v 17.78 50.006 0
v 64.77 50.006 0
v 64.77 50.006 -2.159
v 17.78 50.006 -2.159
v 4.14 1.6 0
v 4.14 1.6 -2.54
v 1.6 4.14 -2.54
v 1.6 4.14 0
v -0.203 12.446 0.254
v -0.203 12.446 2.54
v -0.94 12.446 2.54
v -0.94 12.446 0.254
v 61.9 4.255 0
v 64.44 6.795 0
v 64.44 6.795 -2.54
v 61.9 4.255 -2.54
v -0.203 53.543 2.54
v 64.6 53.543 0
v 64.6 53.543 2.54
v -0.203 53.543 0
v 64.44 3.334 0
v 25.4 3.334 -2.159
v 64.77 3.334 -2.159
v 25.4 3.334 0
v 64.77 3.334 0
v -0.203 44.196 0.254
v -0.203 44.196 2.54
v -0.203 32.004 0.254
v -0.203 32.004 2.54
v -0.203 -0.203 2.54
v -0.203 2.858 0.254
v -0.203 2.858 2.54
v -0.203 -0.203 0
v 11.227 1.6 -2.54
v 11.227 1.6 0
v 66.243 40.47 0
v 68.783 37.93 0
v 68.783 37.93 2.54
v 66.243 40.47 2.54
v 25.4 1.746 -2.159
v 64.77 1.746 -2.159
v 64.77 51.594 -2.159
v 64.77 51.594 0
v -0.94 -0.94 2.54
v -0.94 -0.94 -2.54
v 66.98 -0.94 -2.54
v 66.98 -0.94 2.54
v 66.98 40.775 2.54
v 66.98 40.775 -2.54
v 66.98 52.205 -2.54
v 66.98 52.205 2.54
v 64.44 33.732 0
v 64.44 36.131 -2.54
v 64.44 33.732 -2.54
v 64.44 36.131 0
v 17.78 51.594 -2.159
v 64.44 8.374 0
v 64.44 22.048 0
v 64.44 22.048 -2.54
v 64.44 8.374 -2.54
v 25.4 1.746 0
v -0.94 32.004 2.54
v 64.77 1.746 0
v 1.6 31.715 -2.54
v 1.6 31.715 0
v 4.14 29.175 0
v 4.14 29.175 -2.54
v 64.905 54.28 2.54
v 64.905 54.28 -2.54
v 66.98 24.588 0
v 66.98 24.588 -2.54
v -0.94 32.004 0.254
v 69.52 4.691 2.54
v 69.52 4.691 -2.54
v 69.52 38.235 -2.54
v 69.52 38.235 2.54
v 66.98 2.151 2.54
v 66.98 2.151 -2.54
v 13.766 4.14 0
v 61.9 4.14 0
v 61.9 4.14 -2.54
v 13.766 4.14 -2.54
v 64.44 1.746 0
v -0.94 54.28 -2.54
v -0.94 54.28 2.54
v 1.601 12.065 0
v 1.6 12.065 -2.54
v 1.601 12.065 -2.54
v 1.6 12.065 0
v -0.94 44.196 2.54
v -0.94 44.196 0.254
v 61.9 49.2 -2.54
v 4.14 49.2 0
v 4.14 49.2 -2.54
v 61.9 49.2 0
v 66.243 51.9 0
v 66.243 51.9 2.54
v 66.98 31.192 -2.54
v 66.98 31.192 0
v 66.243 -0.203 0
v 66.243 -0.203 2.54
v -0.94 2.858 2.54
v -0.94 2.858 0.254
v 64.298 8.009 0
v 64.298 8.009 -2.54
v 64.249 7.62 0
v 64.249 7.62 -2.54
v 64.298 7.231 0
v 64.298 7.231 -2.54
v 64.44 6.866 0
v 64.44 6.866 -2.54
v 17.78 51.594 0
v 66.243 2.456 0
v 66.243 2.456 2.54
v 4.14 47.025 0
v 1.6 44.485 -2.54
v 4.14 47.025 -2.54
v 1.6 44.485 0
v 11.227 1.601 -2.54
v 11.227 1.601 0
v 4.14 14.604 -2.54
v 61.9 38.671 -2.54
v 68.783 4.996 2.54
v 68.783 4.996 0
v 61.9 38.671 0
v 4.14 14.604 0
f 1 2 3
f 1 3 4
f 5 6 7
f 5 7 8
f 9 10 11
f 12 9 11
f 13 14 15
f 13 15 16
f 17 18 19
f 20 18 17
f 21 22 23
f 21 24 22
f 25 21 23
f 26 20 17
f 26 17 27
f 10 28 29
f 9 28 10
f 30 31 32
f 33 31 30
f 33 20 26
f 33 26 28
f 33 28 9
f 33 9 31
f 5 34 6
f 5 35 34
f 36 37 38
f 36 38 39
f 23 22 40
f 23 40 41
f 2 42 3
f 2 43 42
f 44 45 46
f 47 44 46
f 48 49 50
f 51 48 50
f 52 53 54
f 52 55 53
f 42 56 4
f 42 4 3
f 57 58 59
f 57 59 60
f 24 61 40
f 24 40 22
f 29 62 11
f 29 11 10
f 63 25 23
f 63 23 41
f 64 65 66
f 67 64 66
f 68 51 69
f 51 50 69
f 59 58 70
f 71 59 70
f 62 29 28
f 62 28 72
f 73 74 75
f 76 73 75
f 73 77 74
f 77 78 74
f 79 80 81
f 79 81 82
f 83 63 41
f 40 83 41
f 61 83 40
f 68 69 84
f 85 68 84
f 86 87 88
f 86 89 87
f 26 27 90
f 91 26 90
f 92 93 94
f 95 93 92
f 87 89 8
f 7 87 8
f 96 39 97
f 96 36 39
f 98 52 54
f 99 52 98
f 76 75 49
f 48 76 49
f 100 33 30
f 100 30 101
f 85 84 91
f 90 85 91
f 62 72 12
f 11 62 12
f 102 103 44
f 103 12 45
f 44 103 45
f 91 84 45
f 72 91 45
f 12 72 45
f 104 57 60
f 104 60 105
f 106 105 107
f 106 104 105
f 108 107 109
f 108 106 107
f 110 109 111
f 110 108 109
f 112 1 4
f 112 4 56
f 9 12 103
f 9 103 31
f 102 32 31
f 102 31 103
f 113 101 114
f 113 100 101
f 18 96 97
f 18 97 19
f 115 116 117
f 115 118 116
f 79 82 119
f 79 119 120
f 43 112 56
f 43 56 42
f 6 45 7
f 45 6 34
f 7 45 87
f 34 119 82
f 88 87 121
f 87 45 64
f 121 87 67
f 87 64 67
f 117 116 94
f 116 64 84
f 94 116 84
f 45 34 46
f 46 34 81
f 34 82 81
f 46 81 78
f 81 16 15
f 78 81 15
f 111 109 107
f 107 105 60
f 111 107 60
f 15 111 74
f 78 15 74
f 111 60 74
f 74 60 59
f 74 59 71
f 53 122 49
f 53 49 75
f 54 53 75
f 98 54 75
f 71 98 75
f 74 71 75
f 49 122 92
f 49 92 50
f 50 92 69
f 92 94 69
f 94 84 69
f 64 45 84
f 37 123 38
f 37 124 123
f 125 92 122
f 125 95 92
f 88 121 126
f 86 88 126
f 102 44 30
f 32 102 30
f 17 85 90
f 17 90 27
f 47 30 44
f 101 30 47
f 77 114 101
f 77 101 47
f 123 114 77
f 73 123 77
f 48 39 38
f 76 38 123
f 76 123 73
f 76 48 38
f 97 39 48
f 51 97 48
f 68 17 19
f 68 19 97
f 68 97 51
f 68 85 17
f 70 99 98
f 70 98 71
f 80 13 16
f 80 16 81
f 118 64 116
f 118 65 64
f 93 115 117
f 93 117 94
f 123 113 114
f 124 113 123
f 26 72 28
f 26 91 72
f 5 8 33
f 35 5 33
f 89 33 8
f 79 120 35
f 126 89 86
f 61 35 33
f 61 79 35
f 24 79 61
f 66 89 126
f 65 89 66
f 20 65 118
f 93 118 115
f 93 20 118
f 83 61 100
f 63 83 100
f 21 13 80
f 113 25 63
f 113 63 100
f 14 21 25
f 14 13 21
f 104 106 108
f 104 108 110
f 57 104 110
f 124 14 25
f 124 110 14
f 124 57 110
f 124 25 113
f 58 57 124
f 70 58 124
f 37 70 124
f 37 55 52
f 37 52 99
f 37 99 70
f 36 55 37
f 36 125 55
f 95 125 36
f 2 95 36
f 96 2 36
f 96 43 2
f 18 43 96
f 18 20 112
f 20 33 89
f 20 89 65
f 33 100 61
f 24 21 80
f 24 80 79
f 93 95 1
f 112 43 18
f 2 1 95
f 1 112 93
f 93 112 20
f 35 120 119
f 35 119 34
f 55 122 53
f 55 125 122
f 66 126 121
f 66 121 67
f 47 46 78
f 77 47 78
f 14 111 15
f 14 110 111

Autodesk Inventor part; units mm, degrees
ref_plane "YZ Plane" through (0, 0, 0) normal (1, 0, 0) x (0, 1, 0)
ref_plane "XZ Plane" through (0, 0, 0) normal (0, 1, 0) x (-1, 0, 0)
ref_plane "XY Plane" through (0, 0, 0) normal (0, 0, 1) x (1, 0, 0)
sketch "Sketch1" plane through (0, 0, 0) normal (0, 0, 1) x (1, 0, 0)
  line L0 (0, 53.34) -> (64.516, 53.34)
  line L1 (64.516, 53.34) -> (66.04, 51.816)
  line L2 (66.04, 51.816) -> (66.04, 40.386)
  line L3 (66.04, 40.386) -> (68.58, 37.846)
  line L4 (68.58, 37.846) -> (68.58, 5.08)
  line L5 (66.04, 0) -> (0, 0)
  line L6 (0, 0) -> (0, 53.34)
  line L7 (68.58, 5.08) -> (66.04, 2.54)
  line L8 (66.04, 2.54) -> (66.04, 0)
  line L9 (64.9053, 54.2798) -> (-0.9398, 54.2798)
  line L10 (-0.9398, 54.2798) -> (-0.9398, -0.9398)
  line L11 (-0.9398, -0.9398) -> (66.9798, -0.9398)
  line L12 (66.9798, -0.9398) -> (66.9798, 2.1507)
  line L13 (66.9798, 2.1507) -> (69.5198, 4.6907)
  line L14 (69.5198, 4.6907) -> (69.5198, 38.2353)
  line L15 (69.5198, 38.2353) -> (66.9798, 40.7753)
  line L16 (66.9798, 40.7753) -> (66.9798, 52.2053)
  line L17 (66.9798, 52.2053) -> (64.9053, 54.2798)
  line L18 (64.6002, 53.5432) -> (-0.2032, 53.5432)
  line L19 (-0.2032, 53.5432) -> (-0.2032, -0.2032)
  line L20 (-0.2032, -0.2032) -> (66.2432, -0.2032)
  line L21 (66.2432, -0.2032) -> (66.2432, 2.4558)
  line L22 (66.2432, 2.4558) -> (68.7832, 4.9958)
  line L23 (68.7832, 4.9958) -> (68.7832, 37.9302)
  line L24 (68.7832, 37.9302) -> (66.2432, 40.4702)
  line L25 (66.2432, 40.4702) -> (66.2432, 51.9002)
  line L26 (66.2432, 51.9002) -> (64.6002, 53.5432)
  point P0 (0, 0)
  dimension "d0" = 64.516
  dimension "d1" = 53.34
  dimension "d4" = 66.04
  dimension "d5" = 51.816
  dimension "d6" = 68.58
  dimension "d7" = 40.386
  dimension "d8" = 37.846
  dimension "d9" = 66.04
  dimension "d10" = 2.54
  dimension "d11" = 5.08
  dimension "d15" = 0.2032
  dimension "d18" = 0.7366
extrude "Extrusion2" add sketch "Sketch1" along normal blind 2.54 contours L17 L16 L15 L14 L13 L12 L11 L10 L9
sketch "Sketch2" plane through (0, 0, 0) normal (0, 0, 1) x (1, 0, 0)
  line L0 (0, 53.34) -> (64.516, 53.34)
  line L1 (64.516, 53.34) -> (66.04, 51.816)
  line L2 (66.04, 51.816) -> (66.04, 40.386)
  line L3 (66.04, 40.386) -> (68.58, 37.846)
  line L4 (68.58, 37.846) -> (68.58, 5.08)
  line L5 (66.04, 0) -> (0, 0)
  line L6 (0, 0) -> (0, 53.34)
  line L7 (68.58, 5.08) -> (66.04, 2.54)
  line L8 (66.04, 2.54) -> (66.04, 0)
  line L9 (64.9053, 54.2798) -> (-0.9398, 54.2798)
  line L10 (-0.9398, 54.2798) -> (-0.9398, -0.9398)
  line L11 (-0.9398, -0.9398) -> (66.9798, -0.9398)
  line L12 (66.9798, -0.9398) -> (66.9798, 2.1507)
  line L13 (66.9798, 2.1507) -> (69.5198, 4.6907)
  line L14 (69.5198, 4.6907) -> (69.5198, 38.2353)
  line L15 (69.5198, 38.2353) -> (66.9798, 40.7753)
  line L16 (66.9798, 40.7753) -> (66.9798, 52.2053)
  line L17 (66.9798, 52.2053) -> (64.9053, 54.2798)
  line L18 (64.6002, 53.5432) -> (-0.2032, 53.5432)
  line L19 (-0.2032, 53.5432) -> (-0.2032, -0.2032)
  line L20 (-0.2032, -0.2032) -> (66.2432, -0.2032)
  line L21 (66.2432, -0.2032) -> (66.2432, 2.4558)
  line L22 (66.2432, 2.4558) -> (68.7832, 4.9958)
  line L23 (68.7832, 4.9958) -> (68.7832, 37.9302)
  line L24 (68.7832, 37.9302) -> (66.2432, 40.4702)
  line L25 (66.2432, 40.4702) -> (66.2432, 51.9002)
  line L26 (66.2432, 51.9002) -> (64.6002, 53.5432)
  line L27 (4.1402, 49.1998) -> (61.8998, 49.1998)
  line L28 (61.8998, 49.1998) -> (61.8998, 38.6711)
  line L29 (61.8998, 38.6711) -> (64.4398, 36.1311)
  line L30 (64.4398, 6.7949) -> (61.8998, 4.2549)
  line L31 (61.8998, 4.2549) -> (61.8998, 4.1402)
  line L32 (61.8998, 4.1402) -> (4.1402, 4.1402)
  line L33 (4.1402, 4.1402) -> (4.1402, 49.1998)
  line L34 (63.627, 30.43) -> (66.167, 30.43) construction
  line L35 (66.167, 30.43) -> (66.167, 25.35) construction
  line L36 (66.167, 25.35) -> (63.627, 25.35) construction
  line L37 (63.627, 25.35) -> (63.627, 30.43) construction
  line L38 (64.4398, 36.1311) -> (64.4398, 0)
  circle A0 centre (15.24, 50.8) radius 1.5875
  circle A1 centre (66.04, 35.3568) radius 1.5875
  circle A2 centre (65.8368, 7.62) radius 1.5875
  circle A3 centre (13.97, 2.54) radius 1.5875
  point P0 (0, 0)
  point P1 (0, 1.4137)
  dimension "d19" = 64.516
  dimension "d20" = 53.34
  dimension "d21" = 66.04
  dimension "d22" = 51.816
  dimension "d23" = 68.58
  dimension "d24" = 40.386
  dimension "d25" = 37.846
  dimension "d26" = 66.04
  dimension "d27" = 2.54
  dimension "d28" = 5.08
  dimension "d29" = 0.2032
  dimension "d30" = 0.7366
  dimension "d31" = 5.08
  dimension "d56" = 30.43
  dimension "d57" = 63.627
  dimension "d58" = 5.08
  dimension "d61" = 2.54
  dimension "d70" = 13.97
  dimension "d71" = 2.54
  dimension "d72" = 3.175
  dimension "d73" = 50.8
  dimension "d74" = 3.175
  dimension "d75" = 15.24
  dimension "d76" = 66.04
  dimension "d77" = 35.56
  dimension "d78" = 3.175
  dimension "d79" = 3.175
  dimension "d80" = 66.04
  dimension "d81" = 7.62
extrude "Extrusion3" add sketch "Sketch2" against normal blind 2.54 contours L0 L1 L2 L3 L4 L7 L8 L5 L6 | A2 L38 | L38 A2 | L17 L16 L15 L14 L13 L12 L11 L10 L9 | L26 L25 L24 L23 L22 L21 L20 L19 L18 | A0 | A1 | A3
sketch "Sketch4" plane through (0, 0, 2.54) normal (0, 0, 1) x (1, 0, 0)
  line L0 (-0.2032, -0.2032) -> (-0.2032, 53.5432) projected
  line L1 (-0.9398, -0.9398) -> (-0.9398, 54.2798) projected
  line L2 (-0.2032, 12.446) -> (-0.9398, 12.446)
  line L3 (-0.2032, 2.8575) -> (-0.9398, 2.8575)
  line L4 (-0.2032, 32.004) -> (-0.9398, 32.004)
  line L5 (-0.2032, 44.196) -> (-0.9398, 44.196)
  point P0 (0, 0)
  dimension "d35" = 12.446
  dimension "d36" = 2.8575
  dimension "d37" = 32.004
  dimension "d38" = 44.196
extrude "Extrusion4" cut sketch "Sketch4" against normal blind 2.286 contours L3 L1 L2 L0 | L4 L1 L5 L0
sketch "Sketch5" plane through (0, 0, 0) normal (0, 0, 1) x (1, 0, 0)
  line L0 (25.4, 3.3338) -> (64.77, 3.3338)
  line L1 (64.77, 3.3338) -> (64.77, 1.7463)
  line L2 (64.77, 1.7463) -> (25.4, 1.7463)
  line L3 (25.4, 1.7463) -> (25.4, 3.3338)
  line L4 (17.78, 51.5938) -> (64.77, 51.5938)
  line L5 (64.77, 51.5938) -> (64.77, 50.0062)
  line L6 (64.77, 50.0062) -> (17.78, 50.0062)
  line L7 (17.78, 50.0062) -> (17.78, 51.5938)
  line L8 (-0.2032, 53.5432) -> (-0.2032, -0.2032) projected
  line L9 (-0.2032, 12.065) -> (11.2268, 12.065)
  line L10 (11.2268, 12.065) -> (11.2268, 1.6002)
  line L11 (11.2268, 1.6002) -> (-0.2032, 1.6002)
  line L12 (-0.2032, 1.6002) -> (-0.2032, 12.065)
  line L13 (1.6002, 12.065) -> (1.6002, 1.6002)
  line L14 (63.627, 30.43) -> (66.167, 30.43) construction
  line L15 (63.627, 25.35) -> (63.627, 30.43) construction
  line L16 (66.167, 30.43) -> (66.167, 25.35) construction
  line L17 (66.167, 25.35) -> (63.627, 25.35) construction
  line L18 (4.1402, 4.1402) -> (4.1402, 49.1998) projected
  line L19 (4.1402, 49.1998) -> (61.8998, 49.1998) projected
  line L20 (61.8998, 49.1998) -> (61.8998, 38.6711) projected
  line L21 (61.8998, 38.6711) -> (64.4398, 36.1311) projected
  line L22 (64.4398, 6.866) -> (64.4398, 6.7949) projected
  line L23 (64.4398, 6.7949) -> (61.8998, 4.2549) projected
  line L24 (61.8998, 4.2549) -> (61.8998, 4.1402) projected
  line L25 (61.8998, 4.1402) -> (4.1402, 4.1402) projected
  line L26 (66.2432, 51.9002) -> (64.6002, 53.5432) projected
  line L27 (64.6002, 53.5432) -> (-0.2032, 53.5432) projected
  line L28 (-0.2032, 53.5432) -> (-0.2032, -0.2032) projected
  line L29 (-0.2032, -0.2032) -> (66.2432, -0.2032) projected
  line L30 (66.2432, -0.2032) -> (66.2432, 2.4558) projected
  line L31 (66.2432, 2.4558) -> (68.7832, 4.9958) projected
  line L32 (68.7832, 4.9958) -> (68.7832, 37.9302) projected
  line L33 (68.7832, 37.9302) -> (66.2432, 40.4702) projected
  line L34 (66.2432, 40.4702) -> (66.2432, 51.9002) projected
  line L35 (64.4398, 36.1311) -> (64.4398, 6.7949) projected
  line L36 (64.4398, 33.732) -> (66.9798, 31.192)
  line L37 (64.4398, 22.048) -> (66.9798, 24.588)
  line L38 (66.9798, 31.192) -> (66.9798, 24.588)
  line L39 (64.4398, 33.732) -> (64.4398, 22.048)
  line L40 (61.8998, 4.1402) -> (4.1402, 4.1402) projected
  line L41 (4.1402, 4.1402) -> (4.1402, 49.1998) projected
  line L42 (1.6002, 44.4853) -> (4.1402, 47.0253)
  line L43 (66.2432, 40.4702) -> (66.2432, 51.9002) projected
  line L44 (1.6002, 31.7147) -> (4.1402, 29.1747)
  line L45 (1.6002, 31.7147) -> (1.6002, 44.4853)
  line L46 (4.1402, 47.0253) -> (4.1402, 29.1747)
  arc A0 (64.4398, 8.374) -> (64.4398, 6.866) centre (65.8368, 7.62) ccw projected
  line L47 (64.4398, 36.1311) -> (64.4398, 8.374) projected
  point P0 (0, 0)
  point P1 (64.4398, 31.192)
  point P2 (64.4398, 31.192)
  point P3 (64.4398, 24.588)
  point P4 (64.4398, 24.588)
  dimension "d41" = 1.5875
  dimension "d42" = 25.4
  dimension "d43" = 64.77
  dimension "d44" = 17.78
  dimension "d45" = 64.77
  dimension "d46" = 1.5875
  dimension "d47" = 51.5938
  dimension "d48" = 1.7463
  dimension "d51" = 0
  dimension "d52" = 12.065
  dimension "d54" = 11.43
  dimension "d66" = 2.54
  dimension "d67" = 2.54
  dimension "d68" = 2.54
  dimension "d69" = 2.54
  dimension "d97" = 2.54
  dimension "d101" = 2.54
  dimension "d102" = 2.54
extrude "Extrusion5" cut sketch "Sketch5" against normal blind 2.159 contours L0 L1 L2 L3 | L4 L5 L6 L7
sketch "Sketch7" plane through (0, 0, 0) normal (0, 0, 1) x (1, 0, 0)
  line L0 (25.4, 3.3338) -> (64.77, 3.3338)
  line L1 (64.77, 3.3338) -> (64.77, 1.7463)
  line L2 (64.77, 1.7463) -> (25.4, 1.7463)
  line L3 (25.4, 1.7463) -> (25.4, 3.3338)
  line L4 (17.78, 51.5938) -> (64.77, 51.5938)
  line L5 (64.77, 51.5938) -> (64.77, 50.0062)
  line L6 (64.77, 50.0062) -> (17.78, 50.0062)
  line L7 (17.78, 50.0062) -> (17.78, 51.5938)
  line L8 (-0.2032, 53.5432) -> (-0.2032, -0.2032)
  line L9 (-0.2032, 12.065) -> (11.2268, 12.065)
  line L10 (11.2268, 12.065) -> (11.2268, 1.6002)
  line L11 (11.2268, 1.6002) -> (-0.2032, 1.6002)
  line L12 (-0.2032, 1.6002) -> (-0.2032, 12.065)
  line L13 (1.6002, 12.065) -> (1.6002, 1.6002)
  line L14 (63.627, 30.43) -> (66.167, 30.43) construction
  line L15 (63.627, 25.35) -> (63.627, 30.43) construction
  line L16 (66.167, 30.43) -> (66.167, 25.35) construction
  line L17 (66.167, 25.35) -> (63.627, 25.35) construction
  line L18 (4.1402, 4.1402) -> (4.1402, 49.1998)
  line L19 (4.1402, 49.1998) -> (61.8998, 49.1998)
  line L20 (61.8998, 49.1998) -> (61.8998, 38.6711)
  line L21 (61.8998, 38.6711) -> (64.4398, 36.1311)
  line L22 (64.4398, 6.866) -> (64.4398, 6.7949)
  line L23 (64.4398, 6.7949) -> (61.8998, 4.2549)
  line L24 (61.8998, 4.2549) -> (61.8998, 4.1402)
  line L25 (61.8998, 4.1402) -> (4.1402, 4.1402)
  line L26 (66.2432, 51.9002) -> (64.6002, 53.5432)
  line L27 (64.6002, 53.5432) -> (-0.2032, 53.5432)
  line L28 (-0.2032, 53.5432) -> (-0.2032, -0.2032)
  line L29 (-0.2032, -0.2032) -> (66.2432, -0.2032)
  line L30 (66.2432, -0.2032) -> (66.2432, 2.4558)
  line L31 (66.2432, 2.4558) -> (68.7832, 4.9958)
  line L32 (68.7832, 4.9958) -> (68.7832, 37.9302)
  line L33 (68.7832, 37.9302) -> (66.2432, 40.4702)
  line L34 (66.2432, 40.4702) -> (66.2432, 51.9002)
  line L35 (64.4398, 36.1311) -> (64.4398, 6.7949)
  line L36 (64.4398, 33.732) -> (66.9798, 31.192)
  line L37 (64.4398, 22.048) -> (66.9798, 24.588)
  line L38 (66.9798, 31.192) -> (66.9798, 24.588)
  line L39 (64.4398, 33.732) -> (64.4398, 22.048)
  line L40 (61.8998, 4.1402) -> (4.1402, 4.1402)
  line L41 (4.1402, 4.1402) -> (4.1402, 49.1998)
  line L42 (1.6002, 44.4853) -> (4.1402, 47.0253)
  line L43 (66.2432, 40.4702) -> (66.2432, 51.9002)
  line L44 (1.6002, 31.7147) -> (4.1402, 29.1747)
  line L45 (1.6002, 31.7147) -> (1.6002, 44.4853)
  line L46 (4.1402, 47.0253) -> (4.1402, 29.1747)
  arc A0 (64.4398, 8.374) -> (64.4398, 6.866) centre (65.8368, 7.62) ccw
  line L47 (64.4398, 36.1311) -> (64.4398, 8.374)
  point P0 (0, 0)
  point P1 (0, 0)
  point P2 (64.4398, 31.192)
  point P3 (64.4398, 31.192)
  point P4 (64.4398, 24.588)
  point P5 (64.4398, 24.588)
  dimension "d106" = 1.5875
  dimension "d107" = 25.4
  dimension "d108" = 64.77
  dimension "d109" = 17.78
  dimension "d110" = 64.77
  dimension "d111" = 1.5875
  dimension "d112" = 51.5938
  dimension "d113" = 1.7463
  dimension "d114" = 0
  dimension "d115" = 12.065
  dimension "d116" = 11.43
  dimension "d117" = 2.54
  dimension "d118" = 2.54
  dimension "d119" = 2.54
  dimension "d120" = 2.54
  dimension "d121" = 2.54
  dimension "d122" = 2.54
  dimension "d123" = 2.54
extrude "Extrusion7" cut sketch "Sketch7" against normal through all contours L9 L18 L25 L10 L11 L13 | L9 L10 L25 L18 | L44 L45 L42 L18 | L36 L38 L37 L35
chamfer "Chamfer3" distance 2.54 angle 45 2 edges at (4.1402, 12.065, -1.27) (11.2268, 4.1402, -1.27)
chamfer "Chamfer5" distance 2.54 angle 45 1 edges at (1.6002, 1.6002, -1.27)
equation "\"d67\" = d66"
equation "\"d69\" = d68"
equation "\"d97\" = d101"
equation "\"d102\" = d101"
properties part number "Arduino Bumper 0005"
